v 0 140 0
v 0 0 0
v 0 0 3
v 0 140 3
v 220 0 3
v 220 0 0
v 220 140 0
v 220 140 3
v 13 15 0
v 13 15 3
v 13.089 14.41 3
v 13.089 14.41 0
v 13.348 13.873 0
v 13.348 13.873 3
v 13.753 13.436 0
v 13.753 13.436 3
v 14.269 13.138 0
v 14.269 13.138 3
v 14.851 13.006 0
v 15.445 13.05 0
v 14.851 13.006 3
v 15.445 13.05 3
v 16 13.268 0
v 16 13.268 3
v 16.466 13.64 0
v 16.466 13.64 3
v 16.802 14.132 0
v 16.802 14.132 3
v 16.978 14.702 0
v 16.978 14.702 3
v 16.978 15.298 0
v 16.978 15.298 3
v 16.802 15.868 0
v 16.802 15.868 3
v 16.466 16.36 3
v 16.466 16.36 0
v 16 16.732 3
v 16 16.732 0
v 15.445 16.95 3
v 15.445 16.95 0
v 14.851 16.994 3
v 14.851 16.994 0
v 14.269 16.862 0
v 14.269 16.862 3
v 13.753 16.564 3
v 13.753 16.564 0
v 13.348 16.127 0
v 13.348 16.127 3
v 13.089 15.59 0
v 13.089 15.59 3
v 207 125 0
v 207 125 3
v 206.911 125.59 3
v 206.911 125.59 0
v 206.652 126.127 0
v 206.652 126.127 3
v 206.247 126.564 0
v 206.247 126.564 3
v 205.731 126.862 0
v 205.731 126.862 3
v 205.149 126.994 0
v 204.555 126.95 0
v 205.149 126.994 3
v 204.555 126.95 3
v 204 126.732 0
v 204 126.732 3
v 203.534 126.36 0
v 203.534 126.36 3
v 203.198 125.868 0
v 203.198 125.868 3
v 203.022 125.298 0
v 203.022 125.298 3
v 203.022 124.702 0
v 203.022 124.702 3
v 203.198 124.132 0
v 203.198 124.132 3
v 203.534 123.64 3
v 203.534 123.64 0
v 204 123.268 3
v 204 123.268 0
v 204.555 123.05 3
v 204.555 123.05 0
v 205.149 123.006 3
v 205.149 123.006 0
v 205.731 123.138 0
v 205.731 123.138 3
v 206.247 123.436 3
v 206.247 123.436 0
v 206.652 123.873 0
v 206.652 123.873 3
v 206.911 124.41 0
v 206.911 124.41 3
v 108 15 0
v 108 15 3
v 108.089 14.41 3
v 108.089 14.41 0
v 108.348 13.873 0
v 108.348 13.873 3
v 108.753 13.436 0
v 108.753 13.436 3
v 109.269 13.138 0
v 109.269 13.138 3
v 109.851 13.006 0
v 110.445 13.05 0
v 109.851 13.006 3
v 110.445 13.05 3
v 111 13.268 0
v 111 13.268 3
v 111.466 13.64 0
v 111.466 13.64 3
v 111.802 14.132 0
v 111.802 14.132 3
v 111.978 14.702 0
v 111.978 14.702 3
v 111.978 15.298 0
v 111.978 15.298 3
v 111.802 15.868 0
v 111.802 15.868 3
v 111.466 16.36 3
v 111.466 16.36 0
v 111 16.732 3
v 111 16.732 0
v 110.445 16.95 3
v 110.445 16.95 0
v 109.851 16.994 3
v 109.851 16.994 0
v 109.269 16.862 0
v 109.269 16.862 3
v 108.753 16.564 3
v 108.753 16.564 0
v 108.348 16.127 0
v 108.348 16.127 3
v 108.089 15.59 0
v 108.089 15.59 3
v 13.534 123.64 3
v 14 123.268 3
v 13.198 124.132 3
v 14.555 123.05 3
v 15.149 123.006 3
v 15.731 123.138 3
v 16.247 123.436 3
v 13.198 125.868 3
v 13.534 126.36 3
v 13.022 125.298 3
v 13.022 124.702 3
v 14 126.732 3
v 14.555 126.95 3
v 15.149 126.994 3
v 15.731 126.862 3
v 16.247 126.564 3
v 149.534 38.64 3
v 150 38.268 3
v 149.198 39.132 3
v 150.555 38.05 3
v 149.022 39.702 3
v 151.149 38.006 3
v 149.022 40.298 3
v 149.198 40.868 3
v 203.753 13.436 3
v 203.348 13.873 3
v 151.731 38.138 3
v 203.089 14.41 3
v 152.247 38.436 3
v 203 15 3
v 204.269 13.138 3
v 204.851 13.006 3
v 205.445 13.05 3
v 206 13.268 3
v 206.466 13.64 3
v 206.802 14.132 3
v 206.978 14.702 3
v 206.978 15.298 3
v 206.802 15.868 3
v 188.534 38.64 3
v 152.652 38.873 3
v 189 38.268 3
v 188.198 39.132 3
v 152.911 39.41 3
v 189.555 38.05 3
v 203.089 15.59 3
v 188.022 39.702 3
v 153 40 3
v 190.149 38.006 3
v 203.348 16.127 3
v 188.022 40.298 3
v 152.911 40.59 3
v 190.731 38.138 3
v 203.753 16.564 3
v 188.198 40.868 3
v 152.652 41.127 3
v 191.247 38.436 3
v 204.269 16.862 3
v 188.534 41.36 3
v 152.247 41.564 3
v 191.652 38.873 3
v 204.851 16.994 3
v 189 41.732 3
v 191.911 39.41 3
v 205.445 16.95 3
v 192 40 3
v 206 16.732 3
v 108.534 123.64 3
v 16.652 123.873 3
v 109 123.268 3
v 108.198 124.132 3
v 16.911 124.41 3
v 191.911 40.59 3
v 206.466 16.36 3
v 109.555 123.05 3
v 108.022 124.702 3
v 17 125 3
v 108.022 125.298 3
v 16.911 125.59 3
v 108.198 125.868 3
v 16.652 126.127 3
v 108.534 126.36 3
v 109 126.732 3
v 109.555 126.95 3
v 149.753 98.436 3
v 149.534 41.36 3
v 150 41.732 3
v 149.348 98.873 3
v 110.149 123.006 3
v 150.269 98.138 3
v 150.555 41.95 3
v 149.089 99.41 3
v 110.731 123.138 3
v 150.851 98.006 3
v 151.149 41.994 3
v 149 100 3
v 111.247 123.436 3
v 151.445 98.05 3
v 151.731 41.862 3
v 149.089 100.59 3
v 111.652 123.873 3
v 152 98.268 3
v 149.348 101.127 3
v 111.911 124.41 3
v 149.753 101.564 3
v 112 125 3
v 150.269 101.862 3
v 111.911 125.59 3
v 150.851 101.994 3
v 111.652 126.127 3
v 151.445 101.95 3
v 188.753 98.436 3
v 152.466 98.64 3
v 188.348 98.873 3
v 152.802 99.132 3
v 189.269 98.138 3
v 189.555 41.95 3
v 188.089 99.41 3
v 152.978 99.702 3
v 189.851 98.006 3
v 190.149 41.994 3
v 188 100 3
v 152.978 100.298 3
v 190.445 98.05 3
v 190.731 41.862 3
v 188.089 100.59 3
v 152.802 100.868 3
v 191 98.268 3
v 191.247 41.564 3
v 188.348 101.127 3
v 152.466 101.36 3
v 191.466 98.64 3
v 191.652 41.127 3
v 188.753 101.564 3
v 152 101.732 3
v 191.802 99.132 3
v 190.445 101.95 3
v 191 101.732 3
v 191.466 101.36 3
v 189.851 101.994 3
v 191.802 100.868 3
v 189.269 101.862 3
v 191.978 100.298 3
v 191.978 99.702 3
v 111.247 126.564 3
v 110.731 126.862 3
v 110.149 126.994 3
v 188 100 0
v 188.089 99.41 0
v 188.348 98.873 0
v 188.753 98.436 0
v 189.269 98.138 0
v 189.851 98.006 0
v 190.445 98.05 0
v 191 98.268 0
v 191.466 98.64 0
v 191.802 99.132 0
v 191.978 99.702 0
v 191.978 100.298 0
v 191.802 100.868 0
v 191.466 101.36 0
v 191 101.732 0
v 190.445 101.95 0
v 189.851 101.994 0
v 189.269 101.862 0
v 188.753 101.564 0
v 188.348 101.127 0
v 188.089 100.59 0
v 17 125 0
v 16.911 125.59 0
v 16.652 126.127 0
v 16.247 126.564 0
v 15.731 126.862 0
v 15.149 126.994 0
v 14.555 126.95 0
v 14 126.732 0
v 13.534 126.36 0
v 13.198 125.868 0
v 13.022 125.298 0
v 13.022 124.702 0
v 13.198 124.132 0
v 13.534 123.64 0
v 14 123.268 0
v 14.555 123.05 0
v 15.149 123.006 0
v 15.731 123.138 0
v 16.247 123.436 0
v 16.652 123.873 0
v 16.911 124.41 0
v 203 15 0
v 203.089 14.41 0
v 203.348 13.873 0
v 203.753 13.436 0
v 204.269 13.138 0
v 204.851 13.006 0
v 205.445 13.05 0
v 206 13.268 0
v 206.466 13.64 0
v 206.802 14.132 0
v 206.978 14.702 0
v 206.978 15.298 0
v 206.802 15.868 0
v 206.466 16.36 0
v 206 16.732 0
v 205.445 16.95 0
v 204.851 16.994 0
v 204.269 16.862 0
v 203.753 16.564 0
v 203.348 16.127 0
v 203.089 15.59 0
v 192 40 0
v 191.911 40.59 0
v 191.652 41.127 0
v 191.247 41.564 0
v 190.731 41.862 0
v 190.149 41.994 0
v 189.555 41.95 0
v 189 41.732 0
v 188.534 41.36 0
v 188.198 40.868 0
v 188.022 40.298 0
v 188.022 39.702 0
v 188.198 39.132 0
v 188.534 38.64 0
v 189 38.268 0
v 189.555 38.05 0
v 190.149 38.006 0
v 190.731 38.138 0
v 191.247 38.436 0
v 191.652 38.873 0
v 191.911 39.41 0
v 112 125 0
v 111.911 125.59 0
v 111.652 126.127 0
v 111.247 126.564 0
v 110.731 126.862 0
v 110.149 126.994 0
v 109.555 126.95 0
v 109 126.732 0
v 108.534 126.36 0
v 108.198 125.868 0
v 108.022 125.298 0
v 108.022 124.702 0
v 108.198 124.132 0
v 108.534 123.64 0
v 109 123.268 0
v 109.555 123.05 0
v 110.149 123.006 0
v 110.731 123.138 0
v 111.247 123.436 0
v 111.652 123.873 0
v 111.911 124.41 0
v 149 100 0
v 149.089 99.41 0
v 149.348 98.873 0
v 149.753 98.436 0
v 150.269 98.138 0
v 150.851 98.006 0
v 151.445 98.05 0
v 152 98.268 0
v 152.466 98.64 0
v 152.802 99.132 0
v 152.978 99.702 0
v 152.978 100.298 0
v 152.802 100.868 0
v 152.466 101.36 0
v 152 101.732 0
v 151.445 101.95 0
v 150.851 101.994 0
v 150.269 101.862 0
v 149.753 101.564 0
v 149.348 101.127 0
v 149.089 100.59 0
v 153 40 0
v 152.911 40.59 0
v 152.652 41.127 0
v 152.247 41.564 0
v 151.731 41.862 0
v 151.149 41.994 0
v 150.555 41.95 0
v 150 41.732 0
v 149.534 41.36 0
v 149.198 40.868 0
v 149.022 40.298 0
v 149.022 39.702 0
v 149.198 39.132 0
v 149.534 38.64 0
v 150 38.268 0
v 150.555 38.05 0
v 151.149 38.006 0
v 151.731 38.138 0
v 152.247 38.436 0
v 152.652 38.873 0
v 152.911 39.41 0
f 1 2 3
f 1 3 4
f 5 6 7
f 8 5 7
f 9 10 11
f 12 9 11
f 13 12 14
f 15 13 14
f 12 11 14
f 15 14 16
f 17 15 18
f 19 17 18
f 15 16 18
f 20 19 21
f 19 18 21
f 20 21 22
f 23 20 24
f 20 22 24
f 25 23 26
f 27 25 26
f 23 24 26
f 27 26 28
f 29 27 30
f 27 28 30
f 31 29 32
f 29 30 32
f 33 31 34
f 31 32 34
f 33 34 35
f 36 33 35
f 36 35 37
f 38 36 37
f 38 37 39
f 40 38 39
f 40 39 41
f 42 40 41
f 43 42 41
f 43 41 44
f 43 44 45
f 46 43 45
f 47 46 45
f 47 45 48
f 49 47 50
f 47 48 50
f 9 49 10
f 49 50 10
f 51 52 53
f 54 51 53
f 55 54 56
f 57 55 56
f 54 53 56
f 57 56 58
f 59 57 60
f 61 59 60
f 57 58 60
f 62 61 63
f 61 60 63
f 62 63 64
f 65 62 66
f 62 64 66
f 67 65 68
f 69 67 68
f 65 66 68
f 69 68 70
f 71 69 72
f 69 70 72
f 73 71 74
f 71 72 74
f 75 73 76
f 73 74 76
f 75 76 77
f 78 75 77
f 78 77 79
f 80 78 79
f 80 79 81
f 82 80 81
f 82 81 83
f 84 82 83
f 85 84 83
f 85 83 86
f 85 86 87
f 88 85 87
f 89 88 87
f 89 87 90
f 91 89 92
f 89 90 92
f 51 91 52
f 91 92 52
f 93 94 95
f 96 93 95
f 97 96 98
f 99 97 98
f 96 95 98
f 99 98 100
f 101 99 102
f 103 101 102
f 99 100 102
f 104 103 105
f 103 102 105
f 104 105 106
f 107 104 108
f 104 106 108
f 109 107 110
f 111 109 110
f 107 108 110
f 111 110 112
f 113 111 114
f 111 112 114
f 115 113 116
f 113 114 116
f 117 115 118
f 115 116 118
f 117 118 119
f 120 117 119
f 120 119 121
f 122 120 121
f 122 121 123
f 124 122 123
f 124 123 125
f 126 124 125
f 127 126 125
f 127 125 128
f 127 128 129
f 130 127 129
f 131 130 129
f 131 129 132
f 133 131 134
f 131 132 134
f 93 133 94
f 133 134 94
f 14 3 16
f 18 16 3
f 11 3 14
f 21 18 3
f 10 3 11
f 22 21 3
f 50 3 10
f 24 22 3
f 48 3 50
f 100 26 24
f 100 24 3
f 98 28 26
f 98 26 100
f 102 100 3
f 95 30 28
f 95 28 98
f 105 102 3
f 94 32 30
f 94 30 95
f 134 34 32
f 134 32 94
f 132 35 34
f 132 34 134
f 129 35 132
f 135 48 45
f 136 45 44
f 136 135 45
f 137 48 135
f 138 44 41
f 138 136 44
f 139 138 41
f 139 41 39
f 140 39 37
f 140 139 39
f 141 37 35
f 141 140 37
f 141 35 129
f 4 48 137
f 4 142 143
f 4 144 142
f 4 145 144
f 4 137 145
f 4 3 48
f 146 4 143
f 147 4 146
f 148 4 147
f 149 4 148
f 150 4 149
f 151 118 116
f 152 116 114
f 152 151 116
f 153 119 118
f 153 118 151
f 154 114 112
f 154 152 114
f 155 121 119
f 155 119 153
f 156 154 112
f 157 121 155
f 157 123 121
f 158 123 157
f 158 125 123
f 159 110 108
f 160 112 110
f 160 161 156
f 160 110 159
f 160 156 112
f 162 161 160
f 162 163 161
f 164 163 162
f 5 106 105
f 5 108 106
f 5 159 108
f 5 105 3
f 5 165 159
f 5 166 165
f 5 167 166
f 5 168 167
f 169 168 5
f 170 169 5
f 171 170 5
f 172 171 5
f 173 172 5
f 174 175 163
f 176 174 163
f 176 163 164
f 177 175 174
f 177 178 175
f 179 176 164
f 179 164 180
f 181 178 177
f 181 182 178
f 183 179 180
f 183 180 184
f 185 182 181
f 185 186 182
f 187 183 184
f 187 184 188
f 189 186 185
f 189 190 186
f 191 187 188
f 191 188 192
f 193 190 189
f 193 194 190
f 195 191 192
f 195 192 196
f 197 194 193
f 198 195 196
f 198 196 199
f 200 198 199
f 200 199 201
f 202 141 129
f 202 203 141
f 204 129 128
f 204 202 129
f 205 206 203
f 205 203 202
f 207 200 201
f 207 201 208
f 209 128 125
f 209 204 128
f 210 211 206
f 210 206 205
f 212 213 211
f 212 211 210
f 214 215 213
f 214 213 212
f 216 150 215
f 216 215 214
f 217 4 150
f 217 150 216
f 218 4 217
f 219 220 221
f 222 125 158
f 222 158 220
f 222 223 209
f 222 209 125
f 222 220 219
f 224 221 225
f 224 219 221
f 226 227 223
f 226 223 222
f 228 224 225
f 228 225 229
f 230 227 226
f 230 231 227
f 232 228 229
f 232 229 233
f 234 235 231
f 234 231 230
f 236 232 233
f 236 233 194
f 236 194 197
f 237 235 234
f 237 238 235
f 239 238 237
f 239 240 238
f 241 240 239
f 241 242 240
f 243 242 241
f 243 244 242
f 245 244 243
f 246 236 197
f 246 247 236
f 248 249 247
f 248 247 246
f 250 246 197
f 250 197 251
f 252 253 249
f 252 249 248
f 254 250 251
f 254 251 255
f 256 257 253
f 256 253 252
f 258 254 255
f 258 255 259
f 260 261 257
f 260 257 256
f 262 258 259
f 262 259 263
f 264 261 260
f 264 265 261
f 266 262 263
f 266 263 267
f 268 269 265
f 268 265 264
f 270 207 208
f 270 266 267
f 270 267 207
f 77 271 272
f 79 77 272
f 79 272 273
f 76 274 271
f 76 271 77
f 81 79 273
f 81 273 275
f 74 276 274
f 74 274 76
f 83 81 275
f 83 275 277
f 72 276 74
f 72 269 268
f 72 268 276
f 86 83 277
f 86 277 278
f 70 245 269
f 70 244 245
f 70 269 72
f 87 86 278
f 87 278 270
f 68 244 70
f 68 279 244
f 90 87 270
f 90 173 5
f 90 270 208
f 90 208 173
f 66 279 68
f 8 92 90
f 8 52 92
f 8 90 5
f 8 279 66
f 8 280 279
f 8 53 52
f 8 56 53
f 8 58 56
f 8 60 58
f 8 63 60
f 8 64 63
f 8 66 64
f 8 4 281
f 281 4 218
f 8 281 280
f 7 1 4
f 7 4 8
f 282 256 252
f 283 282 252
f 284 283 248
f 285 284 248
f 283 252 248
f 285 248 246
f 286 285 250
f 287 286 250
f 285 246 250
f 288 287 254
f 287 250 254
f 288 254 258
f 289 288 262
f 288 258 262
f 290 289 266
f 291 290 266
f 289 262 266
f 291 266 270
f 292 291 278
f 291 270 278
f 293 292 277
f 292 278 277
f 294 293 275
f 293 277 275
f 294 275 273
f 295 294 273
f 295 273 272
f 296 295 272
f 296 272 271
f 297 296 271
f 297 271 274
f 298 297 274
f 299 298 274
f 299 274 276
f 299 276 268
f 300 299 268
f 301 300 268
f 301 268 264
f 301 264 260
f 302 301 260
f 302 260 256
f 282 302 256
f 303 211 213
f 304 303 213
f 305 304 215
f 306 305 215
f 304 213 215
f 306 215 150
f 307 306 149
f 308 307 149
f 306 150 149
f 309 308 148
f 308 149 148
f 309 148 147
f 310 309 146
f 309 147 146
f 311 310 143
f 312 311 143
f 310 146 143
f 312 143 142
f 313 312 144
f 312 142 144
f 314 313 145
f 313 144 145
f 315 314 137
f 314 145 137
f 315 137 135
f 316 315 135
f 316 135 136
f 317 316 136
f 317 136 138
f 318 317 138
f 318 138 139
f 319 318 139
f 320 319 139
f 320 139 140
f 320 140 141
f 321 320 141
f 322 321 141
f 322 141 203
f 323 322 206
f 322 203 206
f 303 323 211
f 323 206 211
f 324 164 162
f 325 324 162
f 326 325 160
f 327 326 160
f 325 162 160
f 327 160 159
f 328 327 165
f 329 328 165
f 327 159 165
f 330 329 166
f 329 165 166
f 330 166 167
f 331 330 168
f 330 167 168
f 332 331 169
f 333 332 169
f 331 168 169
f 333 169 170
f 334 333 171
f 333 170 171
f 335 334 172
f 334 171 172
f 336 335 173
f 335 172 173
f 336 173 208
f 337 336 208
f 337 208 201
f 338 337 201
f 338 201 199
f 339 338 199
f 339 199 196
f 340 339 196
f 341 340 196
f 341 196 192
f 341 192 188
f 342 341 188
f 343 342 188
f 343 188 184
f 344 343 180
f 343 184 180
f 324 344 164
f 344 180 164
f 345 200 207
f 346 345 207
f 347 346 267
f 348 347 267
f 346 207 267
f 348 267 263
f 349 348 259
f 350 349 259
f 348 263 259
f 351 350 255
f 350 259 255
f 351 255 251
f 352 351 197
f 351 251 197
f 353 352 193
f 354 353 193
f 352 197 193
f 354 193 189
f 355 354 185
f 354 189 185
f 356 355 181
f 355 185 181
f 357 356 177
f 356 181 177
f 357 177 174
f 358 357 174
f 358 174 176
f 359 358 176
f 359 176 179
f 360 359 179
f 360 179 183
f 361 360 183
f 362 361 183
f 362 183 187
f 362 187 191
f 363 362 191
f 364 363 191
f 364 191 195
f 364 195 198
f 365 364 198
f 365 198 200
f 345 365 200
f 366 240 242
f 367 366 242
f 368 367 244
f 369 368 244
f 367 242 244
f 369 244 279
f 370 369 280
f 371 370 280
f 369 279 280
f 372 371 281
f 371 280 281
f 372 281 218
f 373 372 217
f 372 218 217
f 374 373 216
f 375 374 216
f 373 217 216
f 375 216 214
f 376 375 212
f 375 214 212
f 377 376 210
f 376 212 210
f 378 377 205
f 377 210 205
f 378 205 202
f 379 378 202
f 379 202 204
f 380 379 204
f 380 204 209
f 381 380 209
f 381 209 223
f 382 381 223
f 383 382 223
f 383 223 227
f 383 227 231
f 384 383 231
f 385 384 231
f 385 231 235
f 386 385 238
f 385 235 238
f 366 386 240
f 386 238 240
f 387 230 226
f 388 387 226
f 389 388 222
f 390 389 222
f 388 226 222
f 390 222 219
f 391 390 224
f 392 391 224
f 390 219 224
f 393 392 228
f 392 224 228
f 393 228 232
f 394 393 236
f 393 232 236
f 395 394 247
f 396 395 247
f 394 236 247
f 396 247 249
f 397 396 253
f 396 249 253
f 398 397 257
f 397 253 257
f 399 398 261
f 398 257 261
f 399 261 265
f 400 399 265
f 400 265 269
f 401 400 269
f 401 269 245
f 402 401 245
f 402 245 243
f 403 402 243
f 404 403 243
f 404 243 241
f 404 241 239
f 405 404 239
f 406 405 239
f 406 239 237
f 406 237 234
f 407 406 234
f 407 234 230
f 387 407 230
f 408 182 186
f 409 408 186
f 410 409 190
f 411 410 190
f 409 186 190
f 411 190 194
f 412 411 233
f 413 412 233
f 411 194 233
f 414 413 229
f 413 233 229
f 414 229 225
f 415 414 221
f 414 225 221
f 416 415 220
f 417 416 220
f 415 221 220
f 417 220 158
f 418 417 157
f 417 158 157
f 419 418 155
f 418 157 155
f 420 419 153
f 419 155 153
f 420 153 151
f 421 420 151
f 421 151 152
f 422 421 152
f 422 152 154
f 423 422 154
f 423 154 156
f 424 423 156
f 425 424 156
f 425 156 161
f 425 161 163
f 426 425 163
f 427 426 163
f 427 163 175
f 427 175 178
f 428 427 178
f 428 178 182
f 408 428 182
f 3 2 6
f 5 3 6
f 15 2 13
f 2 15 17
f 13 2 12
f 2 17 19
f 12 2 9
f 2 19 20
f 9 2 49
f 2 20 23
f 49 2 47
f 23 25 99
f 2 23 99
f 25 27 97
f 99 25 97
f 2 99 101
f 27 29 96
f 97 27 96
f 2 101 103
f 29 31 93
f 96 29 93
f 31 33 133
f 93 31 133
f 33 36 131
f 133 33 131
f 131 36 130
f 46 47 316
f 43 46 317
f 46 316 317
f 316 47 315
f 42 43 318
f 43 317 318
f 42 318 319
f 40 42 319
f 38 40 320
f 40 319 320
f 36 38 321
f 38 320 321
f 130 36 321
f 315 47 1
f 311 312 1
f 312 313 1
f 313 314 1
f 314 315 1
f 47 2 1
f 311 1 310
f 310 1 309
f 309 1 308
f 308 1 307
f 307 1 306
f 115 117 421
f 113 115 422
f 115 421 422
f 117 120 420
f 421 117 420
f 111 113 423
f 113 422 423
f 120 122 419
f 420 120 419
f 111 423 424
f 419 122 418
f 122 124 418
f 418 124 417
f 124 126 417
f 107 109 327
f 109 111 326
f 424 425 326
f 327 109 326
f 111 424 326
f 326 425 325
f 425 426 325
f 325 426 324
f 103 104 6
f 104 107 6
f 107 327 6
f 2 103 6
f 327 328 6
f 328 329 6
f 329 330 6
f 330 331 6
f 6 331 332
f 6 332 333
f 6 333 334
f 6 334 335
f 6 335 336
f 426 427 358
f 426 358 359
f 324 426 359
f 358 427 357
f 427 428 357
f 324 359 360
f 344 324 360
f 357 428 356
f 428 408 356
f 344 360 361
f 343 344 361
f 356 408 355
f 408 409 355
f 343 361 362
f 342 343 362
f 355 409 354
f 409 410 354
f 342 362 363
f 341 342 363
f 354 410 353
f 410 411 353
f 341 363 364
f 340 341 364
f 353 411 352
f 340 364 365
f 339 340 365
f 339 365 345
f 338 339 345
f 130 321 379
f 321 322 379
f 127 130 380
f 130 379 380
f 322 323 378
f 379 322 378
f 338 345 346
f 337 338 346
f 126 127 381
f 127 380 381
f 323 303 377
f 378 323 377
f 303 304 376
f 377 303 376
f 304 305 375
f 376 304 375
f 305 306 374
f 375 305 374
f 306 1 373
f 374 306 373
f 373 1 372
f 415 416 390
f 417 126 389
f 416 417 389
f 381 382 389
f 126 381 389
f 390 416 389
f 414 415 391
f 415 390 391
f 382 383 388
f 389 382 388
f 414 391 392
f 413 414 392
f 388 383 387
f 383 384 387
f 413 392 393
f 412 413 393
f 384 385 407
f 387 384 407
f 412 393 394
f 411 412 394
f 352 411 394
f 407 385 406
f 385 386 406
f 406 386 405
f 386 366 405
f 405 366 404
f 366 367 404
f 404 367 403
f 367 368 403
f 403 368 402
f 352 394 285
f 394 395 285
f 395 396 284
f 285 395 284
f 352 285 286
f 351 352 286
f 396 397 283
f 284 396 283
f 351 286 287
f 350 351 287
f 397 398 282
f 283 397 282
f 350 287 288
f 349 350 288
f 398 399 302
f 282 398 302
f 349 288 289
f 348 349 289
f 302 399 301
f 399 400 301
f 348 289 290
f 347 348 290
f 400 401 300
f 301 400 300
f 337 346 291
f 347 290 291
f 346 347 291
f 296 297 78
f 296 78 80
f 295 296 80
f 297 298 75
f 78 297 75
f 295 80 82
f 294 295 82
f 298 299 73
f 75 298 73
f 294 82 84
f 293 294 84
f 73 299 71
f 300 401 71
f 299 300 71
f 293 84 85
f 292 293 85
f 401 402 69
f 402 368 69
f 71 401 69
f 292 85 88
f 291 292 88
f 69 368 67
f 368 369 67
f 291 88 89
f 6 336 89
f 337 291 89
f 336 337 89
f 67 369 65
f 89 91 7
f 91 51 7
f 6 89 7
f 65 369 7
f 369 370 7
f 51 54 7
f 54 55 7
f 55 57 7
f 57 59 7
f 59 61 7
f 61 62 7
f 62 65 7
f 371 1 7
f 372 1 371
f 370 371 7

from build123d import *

# Parameters (mm, degrees)
IZIM1_W                     = 220
IZIM1_H                     = 140
Y_KSEKLIK_EKSTR_ZYON1_DEPTH = 3
IZIM2_R                     = 2
KES_EKSTR_ZYON1_DEPTH       = 3
IZIM4_R                     = 2
KES_EKSTR_ZYON3_DEPTH       = 10


with BuildPart() as part:
    # Çizim1 → Yükseklik-Ekstrüzyon1 (new body)
    with BuildSketch(Plane.XY):
        with Locations((110, 70)):
            Rectangle(IZIM1_W, IZIM1_H)
    extrude(amount=Y_KSEKLIK_EKSTR_ZYON1_DEPTH)

    # Çizim2 → Kes-Ekstrüzyon1 (cut)
    with BuildSketch(Plane.XY.offset(3)):
        with Locations((15, 125)):
            Circle(IZIM2_R)
        with Locations((205, 125)):
            Circle(IZIM2_R)
        with Locations((110, 125)):
            Circle(IZIM2_R)
        with Locations(Location((205, 15, 0), (0, 0, 180))):
            Circle(IZIM2_R)
        with Locations(Location((110, 15, 0), (0, 0, 180))):
            Circle(IZIM2_R)
        with Locations(Location((15, 15, 0), (0, 0, 180))):
            Circle(IZIM2_R)
    extrude(amount=-KES_EKSTR_ZYON1_DEPTH, mode=Mode.SUBTRACT)

    # Çizim4 → Kes-Ekstrüzyon3 (cut)
    with BuildSketch(Plane.XY.offset(3)):
        with Locations((190, 40)):
            Circle(IZIM4_R)
        with Locations((151, 40)):
            Circle(IZIM4_R)
        with Locations(Location((190, 100, 0), (0, 0, 180))):
            Circle(IZIM4_R)
        with Locations(Location((151, 100, 0), (0, 0, 180))):
            Circle(IZIM4_R)
    extrude(amount=-KES_EKSTR_ZYON3_DEPTH, mode=Mode.SUBTRACT)


solid = part.part
